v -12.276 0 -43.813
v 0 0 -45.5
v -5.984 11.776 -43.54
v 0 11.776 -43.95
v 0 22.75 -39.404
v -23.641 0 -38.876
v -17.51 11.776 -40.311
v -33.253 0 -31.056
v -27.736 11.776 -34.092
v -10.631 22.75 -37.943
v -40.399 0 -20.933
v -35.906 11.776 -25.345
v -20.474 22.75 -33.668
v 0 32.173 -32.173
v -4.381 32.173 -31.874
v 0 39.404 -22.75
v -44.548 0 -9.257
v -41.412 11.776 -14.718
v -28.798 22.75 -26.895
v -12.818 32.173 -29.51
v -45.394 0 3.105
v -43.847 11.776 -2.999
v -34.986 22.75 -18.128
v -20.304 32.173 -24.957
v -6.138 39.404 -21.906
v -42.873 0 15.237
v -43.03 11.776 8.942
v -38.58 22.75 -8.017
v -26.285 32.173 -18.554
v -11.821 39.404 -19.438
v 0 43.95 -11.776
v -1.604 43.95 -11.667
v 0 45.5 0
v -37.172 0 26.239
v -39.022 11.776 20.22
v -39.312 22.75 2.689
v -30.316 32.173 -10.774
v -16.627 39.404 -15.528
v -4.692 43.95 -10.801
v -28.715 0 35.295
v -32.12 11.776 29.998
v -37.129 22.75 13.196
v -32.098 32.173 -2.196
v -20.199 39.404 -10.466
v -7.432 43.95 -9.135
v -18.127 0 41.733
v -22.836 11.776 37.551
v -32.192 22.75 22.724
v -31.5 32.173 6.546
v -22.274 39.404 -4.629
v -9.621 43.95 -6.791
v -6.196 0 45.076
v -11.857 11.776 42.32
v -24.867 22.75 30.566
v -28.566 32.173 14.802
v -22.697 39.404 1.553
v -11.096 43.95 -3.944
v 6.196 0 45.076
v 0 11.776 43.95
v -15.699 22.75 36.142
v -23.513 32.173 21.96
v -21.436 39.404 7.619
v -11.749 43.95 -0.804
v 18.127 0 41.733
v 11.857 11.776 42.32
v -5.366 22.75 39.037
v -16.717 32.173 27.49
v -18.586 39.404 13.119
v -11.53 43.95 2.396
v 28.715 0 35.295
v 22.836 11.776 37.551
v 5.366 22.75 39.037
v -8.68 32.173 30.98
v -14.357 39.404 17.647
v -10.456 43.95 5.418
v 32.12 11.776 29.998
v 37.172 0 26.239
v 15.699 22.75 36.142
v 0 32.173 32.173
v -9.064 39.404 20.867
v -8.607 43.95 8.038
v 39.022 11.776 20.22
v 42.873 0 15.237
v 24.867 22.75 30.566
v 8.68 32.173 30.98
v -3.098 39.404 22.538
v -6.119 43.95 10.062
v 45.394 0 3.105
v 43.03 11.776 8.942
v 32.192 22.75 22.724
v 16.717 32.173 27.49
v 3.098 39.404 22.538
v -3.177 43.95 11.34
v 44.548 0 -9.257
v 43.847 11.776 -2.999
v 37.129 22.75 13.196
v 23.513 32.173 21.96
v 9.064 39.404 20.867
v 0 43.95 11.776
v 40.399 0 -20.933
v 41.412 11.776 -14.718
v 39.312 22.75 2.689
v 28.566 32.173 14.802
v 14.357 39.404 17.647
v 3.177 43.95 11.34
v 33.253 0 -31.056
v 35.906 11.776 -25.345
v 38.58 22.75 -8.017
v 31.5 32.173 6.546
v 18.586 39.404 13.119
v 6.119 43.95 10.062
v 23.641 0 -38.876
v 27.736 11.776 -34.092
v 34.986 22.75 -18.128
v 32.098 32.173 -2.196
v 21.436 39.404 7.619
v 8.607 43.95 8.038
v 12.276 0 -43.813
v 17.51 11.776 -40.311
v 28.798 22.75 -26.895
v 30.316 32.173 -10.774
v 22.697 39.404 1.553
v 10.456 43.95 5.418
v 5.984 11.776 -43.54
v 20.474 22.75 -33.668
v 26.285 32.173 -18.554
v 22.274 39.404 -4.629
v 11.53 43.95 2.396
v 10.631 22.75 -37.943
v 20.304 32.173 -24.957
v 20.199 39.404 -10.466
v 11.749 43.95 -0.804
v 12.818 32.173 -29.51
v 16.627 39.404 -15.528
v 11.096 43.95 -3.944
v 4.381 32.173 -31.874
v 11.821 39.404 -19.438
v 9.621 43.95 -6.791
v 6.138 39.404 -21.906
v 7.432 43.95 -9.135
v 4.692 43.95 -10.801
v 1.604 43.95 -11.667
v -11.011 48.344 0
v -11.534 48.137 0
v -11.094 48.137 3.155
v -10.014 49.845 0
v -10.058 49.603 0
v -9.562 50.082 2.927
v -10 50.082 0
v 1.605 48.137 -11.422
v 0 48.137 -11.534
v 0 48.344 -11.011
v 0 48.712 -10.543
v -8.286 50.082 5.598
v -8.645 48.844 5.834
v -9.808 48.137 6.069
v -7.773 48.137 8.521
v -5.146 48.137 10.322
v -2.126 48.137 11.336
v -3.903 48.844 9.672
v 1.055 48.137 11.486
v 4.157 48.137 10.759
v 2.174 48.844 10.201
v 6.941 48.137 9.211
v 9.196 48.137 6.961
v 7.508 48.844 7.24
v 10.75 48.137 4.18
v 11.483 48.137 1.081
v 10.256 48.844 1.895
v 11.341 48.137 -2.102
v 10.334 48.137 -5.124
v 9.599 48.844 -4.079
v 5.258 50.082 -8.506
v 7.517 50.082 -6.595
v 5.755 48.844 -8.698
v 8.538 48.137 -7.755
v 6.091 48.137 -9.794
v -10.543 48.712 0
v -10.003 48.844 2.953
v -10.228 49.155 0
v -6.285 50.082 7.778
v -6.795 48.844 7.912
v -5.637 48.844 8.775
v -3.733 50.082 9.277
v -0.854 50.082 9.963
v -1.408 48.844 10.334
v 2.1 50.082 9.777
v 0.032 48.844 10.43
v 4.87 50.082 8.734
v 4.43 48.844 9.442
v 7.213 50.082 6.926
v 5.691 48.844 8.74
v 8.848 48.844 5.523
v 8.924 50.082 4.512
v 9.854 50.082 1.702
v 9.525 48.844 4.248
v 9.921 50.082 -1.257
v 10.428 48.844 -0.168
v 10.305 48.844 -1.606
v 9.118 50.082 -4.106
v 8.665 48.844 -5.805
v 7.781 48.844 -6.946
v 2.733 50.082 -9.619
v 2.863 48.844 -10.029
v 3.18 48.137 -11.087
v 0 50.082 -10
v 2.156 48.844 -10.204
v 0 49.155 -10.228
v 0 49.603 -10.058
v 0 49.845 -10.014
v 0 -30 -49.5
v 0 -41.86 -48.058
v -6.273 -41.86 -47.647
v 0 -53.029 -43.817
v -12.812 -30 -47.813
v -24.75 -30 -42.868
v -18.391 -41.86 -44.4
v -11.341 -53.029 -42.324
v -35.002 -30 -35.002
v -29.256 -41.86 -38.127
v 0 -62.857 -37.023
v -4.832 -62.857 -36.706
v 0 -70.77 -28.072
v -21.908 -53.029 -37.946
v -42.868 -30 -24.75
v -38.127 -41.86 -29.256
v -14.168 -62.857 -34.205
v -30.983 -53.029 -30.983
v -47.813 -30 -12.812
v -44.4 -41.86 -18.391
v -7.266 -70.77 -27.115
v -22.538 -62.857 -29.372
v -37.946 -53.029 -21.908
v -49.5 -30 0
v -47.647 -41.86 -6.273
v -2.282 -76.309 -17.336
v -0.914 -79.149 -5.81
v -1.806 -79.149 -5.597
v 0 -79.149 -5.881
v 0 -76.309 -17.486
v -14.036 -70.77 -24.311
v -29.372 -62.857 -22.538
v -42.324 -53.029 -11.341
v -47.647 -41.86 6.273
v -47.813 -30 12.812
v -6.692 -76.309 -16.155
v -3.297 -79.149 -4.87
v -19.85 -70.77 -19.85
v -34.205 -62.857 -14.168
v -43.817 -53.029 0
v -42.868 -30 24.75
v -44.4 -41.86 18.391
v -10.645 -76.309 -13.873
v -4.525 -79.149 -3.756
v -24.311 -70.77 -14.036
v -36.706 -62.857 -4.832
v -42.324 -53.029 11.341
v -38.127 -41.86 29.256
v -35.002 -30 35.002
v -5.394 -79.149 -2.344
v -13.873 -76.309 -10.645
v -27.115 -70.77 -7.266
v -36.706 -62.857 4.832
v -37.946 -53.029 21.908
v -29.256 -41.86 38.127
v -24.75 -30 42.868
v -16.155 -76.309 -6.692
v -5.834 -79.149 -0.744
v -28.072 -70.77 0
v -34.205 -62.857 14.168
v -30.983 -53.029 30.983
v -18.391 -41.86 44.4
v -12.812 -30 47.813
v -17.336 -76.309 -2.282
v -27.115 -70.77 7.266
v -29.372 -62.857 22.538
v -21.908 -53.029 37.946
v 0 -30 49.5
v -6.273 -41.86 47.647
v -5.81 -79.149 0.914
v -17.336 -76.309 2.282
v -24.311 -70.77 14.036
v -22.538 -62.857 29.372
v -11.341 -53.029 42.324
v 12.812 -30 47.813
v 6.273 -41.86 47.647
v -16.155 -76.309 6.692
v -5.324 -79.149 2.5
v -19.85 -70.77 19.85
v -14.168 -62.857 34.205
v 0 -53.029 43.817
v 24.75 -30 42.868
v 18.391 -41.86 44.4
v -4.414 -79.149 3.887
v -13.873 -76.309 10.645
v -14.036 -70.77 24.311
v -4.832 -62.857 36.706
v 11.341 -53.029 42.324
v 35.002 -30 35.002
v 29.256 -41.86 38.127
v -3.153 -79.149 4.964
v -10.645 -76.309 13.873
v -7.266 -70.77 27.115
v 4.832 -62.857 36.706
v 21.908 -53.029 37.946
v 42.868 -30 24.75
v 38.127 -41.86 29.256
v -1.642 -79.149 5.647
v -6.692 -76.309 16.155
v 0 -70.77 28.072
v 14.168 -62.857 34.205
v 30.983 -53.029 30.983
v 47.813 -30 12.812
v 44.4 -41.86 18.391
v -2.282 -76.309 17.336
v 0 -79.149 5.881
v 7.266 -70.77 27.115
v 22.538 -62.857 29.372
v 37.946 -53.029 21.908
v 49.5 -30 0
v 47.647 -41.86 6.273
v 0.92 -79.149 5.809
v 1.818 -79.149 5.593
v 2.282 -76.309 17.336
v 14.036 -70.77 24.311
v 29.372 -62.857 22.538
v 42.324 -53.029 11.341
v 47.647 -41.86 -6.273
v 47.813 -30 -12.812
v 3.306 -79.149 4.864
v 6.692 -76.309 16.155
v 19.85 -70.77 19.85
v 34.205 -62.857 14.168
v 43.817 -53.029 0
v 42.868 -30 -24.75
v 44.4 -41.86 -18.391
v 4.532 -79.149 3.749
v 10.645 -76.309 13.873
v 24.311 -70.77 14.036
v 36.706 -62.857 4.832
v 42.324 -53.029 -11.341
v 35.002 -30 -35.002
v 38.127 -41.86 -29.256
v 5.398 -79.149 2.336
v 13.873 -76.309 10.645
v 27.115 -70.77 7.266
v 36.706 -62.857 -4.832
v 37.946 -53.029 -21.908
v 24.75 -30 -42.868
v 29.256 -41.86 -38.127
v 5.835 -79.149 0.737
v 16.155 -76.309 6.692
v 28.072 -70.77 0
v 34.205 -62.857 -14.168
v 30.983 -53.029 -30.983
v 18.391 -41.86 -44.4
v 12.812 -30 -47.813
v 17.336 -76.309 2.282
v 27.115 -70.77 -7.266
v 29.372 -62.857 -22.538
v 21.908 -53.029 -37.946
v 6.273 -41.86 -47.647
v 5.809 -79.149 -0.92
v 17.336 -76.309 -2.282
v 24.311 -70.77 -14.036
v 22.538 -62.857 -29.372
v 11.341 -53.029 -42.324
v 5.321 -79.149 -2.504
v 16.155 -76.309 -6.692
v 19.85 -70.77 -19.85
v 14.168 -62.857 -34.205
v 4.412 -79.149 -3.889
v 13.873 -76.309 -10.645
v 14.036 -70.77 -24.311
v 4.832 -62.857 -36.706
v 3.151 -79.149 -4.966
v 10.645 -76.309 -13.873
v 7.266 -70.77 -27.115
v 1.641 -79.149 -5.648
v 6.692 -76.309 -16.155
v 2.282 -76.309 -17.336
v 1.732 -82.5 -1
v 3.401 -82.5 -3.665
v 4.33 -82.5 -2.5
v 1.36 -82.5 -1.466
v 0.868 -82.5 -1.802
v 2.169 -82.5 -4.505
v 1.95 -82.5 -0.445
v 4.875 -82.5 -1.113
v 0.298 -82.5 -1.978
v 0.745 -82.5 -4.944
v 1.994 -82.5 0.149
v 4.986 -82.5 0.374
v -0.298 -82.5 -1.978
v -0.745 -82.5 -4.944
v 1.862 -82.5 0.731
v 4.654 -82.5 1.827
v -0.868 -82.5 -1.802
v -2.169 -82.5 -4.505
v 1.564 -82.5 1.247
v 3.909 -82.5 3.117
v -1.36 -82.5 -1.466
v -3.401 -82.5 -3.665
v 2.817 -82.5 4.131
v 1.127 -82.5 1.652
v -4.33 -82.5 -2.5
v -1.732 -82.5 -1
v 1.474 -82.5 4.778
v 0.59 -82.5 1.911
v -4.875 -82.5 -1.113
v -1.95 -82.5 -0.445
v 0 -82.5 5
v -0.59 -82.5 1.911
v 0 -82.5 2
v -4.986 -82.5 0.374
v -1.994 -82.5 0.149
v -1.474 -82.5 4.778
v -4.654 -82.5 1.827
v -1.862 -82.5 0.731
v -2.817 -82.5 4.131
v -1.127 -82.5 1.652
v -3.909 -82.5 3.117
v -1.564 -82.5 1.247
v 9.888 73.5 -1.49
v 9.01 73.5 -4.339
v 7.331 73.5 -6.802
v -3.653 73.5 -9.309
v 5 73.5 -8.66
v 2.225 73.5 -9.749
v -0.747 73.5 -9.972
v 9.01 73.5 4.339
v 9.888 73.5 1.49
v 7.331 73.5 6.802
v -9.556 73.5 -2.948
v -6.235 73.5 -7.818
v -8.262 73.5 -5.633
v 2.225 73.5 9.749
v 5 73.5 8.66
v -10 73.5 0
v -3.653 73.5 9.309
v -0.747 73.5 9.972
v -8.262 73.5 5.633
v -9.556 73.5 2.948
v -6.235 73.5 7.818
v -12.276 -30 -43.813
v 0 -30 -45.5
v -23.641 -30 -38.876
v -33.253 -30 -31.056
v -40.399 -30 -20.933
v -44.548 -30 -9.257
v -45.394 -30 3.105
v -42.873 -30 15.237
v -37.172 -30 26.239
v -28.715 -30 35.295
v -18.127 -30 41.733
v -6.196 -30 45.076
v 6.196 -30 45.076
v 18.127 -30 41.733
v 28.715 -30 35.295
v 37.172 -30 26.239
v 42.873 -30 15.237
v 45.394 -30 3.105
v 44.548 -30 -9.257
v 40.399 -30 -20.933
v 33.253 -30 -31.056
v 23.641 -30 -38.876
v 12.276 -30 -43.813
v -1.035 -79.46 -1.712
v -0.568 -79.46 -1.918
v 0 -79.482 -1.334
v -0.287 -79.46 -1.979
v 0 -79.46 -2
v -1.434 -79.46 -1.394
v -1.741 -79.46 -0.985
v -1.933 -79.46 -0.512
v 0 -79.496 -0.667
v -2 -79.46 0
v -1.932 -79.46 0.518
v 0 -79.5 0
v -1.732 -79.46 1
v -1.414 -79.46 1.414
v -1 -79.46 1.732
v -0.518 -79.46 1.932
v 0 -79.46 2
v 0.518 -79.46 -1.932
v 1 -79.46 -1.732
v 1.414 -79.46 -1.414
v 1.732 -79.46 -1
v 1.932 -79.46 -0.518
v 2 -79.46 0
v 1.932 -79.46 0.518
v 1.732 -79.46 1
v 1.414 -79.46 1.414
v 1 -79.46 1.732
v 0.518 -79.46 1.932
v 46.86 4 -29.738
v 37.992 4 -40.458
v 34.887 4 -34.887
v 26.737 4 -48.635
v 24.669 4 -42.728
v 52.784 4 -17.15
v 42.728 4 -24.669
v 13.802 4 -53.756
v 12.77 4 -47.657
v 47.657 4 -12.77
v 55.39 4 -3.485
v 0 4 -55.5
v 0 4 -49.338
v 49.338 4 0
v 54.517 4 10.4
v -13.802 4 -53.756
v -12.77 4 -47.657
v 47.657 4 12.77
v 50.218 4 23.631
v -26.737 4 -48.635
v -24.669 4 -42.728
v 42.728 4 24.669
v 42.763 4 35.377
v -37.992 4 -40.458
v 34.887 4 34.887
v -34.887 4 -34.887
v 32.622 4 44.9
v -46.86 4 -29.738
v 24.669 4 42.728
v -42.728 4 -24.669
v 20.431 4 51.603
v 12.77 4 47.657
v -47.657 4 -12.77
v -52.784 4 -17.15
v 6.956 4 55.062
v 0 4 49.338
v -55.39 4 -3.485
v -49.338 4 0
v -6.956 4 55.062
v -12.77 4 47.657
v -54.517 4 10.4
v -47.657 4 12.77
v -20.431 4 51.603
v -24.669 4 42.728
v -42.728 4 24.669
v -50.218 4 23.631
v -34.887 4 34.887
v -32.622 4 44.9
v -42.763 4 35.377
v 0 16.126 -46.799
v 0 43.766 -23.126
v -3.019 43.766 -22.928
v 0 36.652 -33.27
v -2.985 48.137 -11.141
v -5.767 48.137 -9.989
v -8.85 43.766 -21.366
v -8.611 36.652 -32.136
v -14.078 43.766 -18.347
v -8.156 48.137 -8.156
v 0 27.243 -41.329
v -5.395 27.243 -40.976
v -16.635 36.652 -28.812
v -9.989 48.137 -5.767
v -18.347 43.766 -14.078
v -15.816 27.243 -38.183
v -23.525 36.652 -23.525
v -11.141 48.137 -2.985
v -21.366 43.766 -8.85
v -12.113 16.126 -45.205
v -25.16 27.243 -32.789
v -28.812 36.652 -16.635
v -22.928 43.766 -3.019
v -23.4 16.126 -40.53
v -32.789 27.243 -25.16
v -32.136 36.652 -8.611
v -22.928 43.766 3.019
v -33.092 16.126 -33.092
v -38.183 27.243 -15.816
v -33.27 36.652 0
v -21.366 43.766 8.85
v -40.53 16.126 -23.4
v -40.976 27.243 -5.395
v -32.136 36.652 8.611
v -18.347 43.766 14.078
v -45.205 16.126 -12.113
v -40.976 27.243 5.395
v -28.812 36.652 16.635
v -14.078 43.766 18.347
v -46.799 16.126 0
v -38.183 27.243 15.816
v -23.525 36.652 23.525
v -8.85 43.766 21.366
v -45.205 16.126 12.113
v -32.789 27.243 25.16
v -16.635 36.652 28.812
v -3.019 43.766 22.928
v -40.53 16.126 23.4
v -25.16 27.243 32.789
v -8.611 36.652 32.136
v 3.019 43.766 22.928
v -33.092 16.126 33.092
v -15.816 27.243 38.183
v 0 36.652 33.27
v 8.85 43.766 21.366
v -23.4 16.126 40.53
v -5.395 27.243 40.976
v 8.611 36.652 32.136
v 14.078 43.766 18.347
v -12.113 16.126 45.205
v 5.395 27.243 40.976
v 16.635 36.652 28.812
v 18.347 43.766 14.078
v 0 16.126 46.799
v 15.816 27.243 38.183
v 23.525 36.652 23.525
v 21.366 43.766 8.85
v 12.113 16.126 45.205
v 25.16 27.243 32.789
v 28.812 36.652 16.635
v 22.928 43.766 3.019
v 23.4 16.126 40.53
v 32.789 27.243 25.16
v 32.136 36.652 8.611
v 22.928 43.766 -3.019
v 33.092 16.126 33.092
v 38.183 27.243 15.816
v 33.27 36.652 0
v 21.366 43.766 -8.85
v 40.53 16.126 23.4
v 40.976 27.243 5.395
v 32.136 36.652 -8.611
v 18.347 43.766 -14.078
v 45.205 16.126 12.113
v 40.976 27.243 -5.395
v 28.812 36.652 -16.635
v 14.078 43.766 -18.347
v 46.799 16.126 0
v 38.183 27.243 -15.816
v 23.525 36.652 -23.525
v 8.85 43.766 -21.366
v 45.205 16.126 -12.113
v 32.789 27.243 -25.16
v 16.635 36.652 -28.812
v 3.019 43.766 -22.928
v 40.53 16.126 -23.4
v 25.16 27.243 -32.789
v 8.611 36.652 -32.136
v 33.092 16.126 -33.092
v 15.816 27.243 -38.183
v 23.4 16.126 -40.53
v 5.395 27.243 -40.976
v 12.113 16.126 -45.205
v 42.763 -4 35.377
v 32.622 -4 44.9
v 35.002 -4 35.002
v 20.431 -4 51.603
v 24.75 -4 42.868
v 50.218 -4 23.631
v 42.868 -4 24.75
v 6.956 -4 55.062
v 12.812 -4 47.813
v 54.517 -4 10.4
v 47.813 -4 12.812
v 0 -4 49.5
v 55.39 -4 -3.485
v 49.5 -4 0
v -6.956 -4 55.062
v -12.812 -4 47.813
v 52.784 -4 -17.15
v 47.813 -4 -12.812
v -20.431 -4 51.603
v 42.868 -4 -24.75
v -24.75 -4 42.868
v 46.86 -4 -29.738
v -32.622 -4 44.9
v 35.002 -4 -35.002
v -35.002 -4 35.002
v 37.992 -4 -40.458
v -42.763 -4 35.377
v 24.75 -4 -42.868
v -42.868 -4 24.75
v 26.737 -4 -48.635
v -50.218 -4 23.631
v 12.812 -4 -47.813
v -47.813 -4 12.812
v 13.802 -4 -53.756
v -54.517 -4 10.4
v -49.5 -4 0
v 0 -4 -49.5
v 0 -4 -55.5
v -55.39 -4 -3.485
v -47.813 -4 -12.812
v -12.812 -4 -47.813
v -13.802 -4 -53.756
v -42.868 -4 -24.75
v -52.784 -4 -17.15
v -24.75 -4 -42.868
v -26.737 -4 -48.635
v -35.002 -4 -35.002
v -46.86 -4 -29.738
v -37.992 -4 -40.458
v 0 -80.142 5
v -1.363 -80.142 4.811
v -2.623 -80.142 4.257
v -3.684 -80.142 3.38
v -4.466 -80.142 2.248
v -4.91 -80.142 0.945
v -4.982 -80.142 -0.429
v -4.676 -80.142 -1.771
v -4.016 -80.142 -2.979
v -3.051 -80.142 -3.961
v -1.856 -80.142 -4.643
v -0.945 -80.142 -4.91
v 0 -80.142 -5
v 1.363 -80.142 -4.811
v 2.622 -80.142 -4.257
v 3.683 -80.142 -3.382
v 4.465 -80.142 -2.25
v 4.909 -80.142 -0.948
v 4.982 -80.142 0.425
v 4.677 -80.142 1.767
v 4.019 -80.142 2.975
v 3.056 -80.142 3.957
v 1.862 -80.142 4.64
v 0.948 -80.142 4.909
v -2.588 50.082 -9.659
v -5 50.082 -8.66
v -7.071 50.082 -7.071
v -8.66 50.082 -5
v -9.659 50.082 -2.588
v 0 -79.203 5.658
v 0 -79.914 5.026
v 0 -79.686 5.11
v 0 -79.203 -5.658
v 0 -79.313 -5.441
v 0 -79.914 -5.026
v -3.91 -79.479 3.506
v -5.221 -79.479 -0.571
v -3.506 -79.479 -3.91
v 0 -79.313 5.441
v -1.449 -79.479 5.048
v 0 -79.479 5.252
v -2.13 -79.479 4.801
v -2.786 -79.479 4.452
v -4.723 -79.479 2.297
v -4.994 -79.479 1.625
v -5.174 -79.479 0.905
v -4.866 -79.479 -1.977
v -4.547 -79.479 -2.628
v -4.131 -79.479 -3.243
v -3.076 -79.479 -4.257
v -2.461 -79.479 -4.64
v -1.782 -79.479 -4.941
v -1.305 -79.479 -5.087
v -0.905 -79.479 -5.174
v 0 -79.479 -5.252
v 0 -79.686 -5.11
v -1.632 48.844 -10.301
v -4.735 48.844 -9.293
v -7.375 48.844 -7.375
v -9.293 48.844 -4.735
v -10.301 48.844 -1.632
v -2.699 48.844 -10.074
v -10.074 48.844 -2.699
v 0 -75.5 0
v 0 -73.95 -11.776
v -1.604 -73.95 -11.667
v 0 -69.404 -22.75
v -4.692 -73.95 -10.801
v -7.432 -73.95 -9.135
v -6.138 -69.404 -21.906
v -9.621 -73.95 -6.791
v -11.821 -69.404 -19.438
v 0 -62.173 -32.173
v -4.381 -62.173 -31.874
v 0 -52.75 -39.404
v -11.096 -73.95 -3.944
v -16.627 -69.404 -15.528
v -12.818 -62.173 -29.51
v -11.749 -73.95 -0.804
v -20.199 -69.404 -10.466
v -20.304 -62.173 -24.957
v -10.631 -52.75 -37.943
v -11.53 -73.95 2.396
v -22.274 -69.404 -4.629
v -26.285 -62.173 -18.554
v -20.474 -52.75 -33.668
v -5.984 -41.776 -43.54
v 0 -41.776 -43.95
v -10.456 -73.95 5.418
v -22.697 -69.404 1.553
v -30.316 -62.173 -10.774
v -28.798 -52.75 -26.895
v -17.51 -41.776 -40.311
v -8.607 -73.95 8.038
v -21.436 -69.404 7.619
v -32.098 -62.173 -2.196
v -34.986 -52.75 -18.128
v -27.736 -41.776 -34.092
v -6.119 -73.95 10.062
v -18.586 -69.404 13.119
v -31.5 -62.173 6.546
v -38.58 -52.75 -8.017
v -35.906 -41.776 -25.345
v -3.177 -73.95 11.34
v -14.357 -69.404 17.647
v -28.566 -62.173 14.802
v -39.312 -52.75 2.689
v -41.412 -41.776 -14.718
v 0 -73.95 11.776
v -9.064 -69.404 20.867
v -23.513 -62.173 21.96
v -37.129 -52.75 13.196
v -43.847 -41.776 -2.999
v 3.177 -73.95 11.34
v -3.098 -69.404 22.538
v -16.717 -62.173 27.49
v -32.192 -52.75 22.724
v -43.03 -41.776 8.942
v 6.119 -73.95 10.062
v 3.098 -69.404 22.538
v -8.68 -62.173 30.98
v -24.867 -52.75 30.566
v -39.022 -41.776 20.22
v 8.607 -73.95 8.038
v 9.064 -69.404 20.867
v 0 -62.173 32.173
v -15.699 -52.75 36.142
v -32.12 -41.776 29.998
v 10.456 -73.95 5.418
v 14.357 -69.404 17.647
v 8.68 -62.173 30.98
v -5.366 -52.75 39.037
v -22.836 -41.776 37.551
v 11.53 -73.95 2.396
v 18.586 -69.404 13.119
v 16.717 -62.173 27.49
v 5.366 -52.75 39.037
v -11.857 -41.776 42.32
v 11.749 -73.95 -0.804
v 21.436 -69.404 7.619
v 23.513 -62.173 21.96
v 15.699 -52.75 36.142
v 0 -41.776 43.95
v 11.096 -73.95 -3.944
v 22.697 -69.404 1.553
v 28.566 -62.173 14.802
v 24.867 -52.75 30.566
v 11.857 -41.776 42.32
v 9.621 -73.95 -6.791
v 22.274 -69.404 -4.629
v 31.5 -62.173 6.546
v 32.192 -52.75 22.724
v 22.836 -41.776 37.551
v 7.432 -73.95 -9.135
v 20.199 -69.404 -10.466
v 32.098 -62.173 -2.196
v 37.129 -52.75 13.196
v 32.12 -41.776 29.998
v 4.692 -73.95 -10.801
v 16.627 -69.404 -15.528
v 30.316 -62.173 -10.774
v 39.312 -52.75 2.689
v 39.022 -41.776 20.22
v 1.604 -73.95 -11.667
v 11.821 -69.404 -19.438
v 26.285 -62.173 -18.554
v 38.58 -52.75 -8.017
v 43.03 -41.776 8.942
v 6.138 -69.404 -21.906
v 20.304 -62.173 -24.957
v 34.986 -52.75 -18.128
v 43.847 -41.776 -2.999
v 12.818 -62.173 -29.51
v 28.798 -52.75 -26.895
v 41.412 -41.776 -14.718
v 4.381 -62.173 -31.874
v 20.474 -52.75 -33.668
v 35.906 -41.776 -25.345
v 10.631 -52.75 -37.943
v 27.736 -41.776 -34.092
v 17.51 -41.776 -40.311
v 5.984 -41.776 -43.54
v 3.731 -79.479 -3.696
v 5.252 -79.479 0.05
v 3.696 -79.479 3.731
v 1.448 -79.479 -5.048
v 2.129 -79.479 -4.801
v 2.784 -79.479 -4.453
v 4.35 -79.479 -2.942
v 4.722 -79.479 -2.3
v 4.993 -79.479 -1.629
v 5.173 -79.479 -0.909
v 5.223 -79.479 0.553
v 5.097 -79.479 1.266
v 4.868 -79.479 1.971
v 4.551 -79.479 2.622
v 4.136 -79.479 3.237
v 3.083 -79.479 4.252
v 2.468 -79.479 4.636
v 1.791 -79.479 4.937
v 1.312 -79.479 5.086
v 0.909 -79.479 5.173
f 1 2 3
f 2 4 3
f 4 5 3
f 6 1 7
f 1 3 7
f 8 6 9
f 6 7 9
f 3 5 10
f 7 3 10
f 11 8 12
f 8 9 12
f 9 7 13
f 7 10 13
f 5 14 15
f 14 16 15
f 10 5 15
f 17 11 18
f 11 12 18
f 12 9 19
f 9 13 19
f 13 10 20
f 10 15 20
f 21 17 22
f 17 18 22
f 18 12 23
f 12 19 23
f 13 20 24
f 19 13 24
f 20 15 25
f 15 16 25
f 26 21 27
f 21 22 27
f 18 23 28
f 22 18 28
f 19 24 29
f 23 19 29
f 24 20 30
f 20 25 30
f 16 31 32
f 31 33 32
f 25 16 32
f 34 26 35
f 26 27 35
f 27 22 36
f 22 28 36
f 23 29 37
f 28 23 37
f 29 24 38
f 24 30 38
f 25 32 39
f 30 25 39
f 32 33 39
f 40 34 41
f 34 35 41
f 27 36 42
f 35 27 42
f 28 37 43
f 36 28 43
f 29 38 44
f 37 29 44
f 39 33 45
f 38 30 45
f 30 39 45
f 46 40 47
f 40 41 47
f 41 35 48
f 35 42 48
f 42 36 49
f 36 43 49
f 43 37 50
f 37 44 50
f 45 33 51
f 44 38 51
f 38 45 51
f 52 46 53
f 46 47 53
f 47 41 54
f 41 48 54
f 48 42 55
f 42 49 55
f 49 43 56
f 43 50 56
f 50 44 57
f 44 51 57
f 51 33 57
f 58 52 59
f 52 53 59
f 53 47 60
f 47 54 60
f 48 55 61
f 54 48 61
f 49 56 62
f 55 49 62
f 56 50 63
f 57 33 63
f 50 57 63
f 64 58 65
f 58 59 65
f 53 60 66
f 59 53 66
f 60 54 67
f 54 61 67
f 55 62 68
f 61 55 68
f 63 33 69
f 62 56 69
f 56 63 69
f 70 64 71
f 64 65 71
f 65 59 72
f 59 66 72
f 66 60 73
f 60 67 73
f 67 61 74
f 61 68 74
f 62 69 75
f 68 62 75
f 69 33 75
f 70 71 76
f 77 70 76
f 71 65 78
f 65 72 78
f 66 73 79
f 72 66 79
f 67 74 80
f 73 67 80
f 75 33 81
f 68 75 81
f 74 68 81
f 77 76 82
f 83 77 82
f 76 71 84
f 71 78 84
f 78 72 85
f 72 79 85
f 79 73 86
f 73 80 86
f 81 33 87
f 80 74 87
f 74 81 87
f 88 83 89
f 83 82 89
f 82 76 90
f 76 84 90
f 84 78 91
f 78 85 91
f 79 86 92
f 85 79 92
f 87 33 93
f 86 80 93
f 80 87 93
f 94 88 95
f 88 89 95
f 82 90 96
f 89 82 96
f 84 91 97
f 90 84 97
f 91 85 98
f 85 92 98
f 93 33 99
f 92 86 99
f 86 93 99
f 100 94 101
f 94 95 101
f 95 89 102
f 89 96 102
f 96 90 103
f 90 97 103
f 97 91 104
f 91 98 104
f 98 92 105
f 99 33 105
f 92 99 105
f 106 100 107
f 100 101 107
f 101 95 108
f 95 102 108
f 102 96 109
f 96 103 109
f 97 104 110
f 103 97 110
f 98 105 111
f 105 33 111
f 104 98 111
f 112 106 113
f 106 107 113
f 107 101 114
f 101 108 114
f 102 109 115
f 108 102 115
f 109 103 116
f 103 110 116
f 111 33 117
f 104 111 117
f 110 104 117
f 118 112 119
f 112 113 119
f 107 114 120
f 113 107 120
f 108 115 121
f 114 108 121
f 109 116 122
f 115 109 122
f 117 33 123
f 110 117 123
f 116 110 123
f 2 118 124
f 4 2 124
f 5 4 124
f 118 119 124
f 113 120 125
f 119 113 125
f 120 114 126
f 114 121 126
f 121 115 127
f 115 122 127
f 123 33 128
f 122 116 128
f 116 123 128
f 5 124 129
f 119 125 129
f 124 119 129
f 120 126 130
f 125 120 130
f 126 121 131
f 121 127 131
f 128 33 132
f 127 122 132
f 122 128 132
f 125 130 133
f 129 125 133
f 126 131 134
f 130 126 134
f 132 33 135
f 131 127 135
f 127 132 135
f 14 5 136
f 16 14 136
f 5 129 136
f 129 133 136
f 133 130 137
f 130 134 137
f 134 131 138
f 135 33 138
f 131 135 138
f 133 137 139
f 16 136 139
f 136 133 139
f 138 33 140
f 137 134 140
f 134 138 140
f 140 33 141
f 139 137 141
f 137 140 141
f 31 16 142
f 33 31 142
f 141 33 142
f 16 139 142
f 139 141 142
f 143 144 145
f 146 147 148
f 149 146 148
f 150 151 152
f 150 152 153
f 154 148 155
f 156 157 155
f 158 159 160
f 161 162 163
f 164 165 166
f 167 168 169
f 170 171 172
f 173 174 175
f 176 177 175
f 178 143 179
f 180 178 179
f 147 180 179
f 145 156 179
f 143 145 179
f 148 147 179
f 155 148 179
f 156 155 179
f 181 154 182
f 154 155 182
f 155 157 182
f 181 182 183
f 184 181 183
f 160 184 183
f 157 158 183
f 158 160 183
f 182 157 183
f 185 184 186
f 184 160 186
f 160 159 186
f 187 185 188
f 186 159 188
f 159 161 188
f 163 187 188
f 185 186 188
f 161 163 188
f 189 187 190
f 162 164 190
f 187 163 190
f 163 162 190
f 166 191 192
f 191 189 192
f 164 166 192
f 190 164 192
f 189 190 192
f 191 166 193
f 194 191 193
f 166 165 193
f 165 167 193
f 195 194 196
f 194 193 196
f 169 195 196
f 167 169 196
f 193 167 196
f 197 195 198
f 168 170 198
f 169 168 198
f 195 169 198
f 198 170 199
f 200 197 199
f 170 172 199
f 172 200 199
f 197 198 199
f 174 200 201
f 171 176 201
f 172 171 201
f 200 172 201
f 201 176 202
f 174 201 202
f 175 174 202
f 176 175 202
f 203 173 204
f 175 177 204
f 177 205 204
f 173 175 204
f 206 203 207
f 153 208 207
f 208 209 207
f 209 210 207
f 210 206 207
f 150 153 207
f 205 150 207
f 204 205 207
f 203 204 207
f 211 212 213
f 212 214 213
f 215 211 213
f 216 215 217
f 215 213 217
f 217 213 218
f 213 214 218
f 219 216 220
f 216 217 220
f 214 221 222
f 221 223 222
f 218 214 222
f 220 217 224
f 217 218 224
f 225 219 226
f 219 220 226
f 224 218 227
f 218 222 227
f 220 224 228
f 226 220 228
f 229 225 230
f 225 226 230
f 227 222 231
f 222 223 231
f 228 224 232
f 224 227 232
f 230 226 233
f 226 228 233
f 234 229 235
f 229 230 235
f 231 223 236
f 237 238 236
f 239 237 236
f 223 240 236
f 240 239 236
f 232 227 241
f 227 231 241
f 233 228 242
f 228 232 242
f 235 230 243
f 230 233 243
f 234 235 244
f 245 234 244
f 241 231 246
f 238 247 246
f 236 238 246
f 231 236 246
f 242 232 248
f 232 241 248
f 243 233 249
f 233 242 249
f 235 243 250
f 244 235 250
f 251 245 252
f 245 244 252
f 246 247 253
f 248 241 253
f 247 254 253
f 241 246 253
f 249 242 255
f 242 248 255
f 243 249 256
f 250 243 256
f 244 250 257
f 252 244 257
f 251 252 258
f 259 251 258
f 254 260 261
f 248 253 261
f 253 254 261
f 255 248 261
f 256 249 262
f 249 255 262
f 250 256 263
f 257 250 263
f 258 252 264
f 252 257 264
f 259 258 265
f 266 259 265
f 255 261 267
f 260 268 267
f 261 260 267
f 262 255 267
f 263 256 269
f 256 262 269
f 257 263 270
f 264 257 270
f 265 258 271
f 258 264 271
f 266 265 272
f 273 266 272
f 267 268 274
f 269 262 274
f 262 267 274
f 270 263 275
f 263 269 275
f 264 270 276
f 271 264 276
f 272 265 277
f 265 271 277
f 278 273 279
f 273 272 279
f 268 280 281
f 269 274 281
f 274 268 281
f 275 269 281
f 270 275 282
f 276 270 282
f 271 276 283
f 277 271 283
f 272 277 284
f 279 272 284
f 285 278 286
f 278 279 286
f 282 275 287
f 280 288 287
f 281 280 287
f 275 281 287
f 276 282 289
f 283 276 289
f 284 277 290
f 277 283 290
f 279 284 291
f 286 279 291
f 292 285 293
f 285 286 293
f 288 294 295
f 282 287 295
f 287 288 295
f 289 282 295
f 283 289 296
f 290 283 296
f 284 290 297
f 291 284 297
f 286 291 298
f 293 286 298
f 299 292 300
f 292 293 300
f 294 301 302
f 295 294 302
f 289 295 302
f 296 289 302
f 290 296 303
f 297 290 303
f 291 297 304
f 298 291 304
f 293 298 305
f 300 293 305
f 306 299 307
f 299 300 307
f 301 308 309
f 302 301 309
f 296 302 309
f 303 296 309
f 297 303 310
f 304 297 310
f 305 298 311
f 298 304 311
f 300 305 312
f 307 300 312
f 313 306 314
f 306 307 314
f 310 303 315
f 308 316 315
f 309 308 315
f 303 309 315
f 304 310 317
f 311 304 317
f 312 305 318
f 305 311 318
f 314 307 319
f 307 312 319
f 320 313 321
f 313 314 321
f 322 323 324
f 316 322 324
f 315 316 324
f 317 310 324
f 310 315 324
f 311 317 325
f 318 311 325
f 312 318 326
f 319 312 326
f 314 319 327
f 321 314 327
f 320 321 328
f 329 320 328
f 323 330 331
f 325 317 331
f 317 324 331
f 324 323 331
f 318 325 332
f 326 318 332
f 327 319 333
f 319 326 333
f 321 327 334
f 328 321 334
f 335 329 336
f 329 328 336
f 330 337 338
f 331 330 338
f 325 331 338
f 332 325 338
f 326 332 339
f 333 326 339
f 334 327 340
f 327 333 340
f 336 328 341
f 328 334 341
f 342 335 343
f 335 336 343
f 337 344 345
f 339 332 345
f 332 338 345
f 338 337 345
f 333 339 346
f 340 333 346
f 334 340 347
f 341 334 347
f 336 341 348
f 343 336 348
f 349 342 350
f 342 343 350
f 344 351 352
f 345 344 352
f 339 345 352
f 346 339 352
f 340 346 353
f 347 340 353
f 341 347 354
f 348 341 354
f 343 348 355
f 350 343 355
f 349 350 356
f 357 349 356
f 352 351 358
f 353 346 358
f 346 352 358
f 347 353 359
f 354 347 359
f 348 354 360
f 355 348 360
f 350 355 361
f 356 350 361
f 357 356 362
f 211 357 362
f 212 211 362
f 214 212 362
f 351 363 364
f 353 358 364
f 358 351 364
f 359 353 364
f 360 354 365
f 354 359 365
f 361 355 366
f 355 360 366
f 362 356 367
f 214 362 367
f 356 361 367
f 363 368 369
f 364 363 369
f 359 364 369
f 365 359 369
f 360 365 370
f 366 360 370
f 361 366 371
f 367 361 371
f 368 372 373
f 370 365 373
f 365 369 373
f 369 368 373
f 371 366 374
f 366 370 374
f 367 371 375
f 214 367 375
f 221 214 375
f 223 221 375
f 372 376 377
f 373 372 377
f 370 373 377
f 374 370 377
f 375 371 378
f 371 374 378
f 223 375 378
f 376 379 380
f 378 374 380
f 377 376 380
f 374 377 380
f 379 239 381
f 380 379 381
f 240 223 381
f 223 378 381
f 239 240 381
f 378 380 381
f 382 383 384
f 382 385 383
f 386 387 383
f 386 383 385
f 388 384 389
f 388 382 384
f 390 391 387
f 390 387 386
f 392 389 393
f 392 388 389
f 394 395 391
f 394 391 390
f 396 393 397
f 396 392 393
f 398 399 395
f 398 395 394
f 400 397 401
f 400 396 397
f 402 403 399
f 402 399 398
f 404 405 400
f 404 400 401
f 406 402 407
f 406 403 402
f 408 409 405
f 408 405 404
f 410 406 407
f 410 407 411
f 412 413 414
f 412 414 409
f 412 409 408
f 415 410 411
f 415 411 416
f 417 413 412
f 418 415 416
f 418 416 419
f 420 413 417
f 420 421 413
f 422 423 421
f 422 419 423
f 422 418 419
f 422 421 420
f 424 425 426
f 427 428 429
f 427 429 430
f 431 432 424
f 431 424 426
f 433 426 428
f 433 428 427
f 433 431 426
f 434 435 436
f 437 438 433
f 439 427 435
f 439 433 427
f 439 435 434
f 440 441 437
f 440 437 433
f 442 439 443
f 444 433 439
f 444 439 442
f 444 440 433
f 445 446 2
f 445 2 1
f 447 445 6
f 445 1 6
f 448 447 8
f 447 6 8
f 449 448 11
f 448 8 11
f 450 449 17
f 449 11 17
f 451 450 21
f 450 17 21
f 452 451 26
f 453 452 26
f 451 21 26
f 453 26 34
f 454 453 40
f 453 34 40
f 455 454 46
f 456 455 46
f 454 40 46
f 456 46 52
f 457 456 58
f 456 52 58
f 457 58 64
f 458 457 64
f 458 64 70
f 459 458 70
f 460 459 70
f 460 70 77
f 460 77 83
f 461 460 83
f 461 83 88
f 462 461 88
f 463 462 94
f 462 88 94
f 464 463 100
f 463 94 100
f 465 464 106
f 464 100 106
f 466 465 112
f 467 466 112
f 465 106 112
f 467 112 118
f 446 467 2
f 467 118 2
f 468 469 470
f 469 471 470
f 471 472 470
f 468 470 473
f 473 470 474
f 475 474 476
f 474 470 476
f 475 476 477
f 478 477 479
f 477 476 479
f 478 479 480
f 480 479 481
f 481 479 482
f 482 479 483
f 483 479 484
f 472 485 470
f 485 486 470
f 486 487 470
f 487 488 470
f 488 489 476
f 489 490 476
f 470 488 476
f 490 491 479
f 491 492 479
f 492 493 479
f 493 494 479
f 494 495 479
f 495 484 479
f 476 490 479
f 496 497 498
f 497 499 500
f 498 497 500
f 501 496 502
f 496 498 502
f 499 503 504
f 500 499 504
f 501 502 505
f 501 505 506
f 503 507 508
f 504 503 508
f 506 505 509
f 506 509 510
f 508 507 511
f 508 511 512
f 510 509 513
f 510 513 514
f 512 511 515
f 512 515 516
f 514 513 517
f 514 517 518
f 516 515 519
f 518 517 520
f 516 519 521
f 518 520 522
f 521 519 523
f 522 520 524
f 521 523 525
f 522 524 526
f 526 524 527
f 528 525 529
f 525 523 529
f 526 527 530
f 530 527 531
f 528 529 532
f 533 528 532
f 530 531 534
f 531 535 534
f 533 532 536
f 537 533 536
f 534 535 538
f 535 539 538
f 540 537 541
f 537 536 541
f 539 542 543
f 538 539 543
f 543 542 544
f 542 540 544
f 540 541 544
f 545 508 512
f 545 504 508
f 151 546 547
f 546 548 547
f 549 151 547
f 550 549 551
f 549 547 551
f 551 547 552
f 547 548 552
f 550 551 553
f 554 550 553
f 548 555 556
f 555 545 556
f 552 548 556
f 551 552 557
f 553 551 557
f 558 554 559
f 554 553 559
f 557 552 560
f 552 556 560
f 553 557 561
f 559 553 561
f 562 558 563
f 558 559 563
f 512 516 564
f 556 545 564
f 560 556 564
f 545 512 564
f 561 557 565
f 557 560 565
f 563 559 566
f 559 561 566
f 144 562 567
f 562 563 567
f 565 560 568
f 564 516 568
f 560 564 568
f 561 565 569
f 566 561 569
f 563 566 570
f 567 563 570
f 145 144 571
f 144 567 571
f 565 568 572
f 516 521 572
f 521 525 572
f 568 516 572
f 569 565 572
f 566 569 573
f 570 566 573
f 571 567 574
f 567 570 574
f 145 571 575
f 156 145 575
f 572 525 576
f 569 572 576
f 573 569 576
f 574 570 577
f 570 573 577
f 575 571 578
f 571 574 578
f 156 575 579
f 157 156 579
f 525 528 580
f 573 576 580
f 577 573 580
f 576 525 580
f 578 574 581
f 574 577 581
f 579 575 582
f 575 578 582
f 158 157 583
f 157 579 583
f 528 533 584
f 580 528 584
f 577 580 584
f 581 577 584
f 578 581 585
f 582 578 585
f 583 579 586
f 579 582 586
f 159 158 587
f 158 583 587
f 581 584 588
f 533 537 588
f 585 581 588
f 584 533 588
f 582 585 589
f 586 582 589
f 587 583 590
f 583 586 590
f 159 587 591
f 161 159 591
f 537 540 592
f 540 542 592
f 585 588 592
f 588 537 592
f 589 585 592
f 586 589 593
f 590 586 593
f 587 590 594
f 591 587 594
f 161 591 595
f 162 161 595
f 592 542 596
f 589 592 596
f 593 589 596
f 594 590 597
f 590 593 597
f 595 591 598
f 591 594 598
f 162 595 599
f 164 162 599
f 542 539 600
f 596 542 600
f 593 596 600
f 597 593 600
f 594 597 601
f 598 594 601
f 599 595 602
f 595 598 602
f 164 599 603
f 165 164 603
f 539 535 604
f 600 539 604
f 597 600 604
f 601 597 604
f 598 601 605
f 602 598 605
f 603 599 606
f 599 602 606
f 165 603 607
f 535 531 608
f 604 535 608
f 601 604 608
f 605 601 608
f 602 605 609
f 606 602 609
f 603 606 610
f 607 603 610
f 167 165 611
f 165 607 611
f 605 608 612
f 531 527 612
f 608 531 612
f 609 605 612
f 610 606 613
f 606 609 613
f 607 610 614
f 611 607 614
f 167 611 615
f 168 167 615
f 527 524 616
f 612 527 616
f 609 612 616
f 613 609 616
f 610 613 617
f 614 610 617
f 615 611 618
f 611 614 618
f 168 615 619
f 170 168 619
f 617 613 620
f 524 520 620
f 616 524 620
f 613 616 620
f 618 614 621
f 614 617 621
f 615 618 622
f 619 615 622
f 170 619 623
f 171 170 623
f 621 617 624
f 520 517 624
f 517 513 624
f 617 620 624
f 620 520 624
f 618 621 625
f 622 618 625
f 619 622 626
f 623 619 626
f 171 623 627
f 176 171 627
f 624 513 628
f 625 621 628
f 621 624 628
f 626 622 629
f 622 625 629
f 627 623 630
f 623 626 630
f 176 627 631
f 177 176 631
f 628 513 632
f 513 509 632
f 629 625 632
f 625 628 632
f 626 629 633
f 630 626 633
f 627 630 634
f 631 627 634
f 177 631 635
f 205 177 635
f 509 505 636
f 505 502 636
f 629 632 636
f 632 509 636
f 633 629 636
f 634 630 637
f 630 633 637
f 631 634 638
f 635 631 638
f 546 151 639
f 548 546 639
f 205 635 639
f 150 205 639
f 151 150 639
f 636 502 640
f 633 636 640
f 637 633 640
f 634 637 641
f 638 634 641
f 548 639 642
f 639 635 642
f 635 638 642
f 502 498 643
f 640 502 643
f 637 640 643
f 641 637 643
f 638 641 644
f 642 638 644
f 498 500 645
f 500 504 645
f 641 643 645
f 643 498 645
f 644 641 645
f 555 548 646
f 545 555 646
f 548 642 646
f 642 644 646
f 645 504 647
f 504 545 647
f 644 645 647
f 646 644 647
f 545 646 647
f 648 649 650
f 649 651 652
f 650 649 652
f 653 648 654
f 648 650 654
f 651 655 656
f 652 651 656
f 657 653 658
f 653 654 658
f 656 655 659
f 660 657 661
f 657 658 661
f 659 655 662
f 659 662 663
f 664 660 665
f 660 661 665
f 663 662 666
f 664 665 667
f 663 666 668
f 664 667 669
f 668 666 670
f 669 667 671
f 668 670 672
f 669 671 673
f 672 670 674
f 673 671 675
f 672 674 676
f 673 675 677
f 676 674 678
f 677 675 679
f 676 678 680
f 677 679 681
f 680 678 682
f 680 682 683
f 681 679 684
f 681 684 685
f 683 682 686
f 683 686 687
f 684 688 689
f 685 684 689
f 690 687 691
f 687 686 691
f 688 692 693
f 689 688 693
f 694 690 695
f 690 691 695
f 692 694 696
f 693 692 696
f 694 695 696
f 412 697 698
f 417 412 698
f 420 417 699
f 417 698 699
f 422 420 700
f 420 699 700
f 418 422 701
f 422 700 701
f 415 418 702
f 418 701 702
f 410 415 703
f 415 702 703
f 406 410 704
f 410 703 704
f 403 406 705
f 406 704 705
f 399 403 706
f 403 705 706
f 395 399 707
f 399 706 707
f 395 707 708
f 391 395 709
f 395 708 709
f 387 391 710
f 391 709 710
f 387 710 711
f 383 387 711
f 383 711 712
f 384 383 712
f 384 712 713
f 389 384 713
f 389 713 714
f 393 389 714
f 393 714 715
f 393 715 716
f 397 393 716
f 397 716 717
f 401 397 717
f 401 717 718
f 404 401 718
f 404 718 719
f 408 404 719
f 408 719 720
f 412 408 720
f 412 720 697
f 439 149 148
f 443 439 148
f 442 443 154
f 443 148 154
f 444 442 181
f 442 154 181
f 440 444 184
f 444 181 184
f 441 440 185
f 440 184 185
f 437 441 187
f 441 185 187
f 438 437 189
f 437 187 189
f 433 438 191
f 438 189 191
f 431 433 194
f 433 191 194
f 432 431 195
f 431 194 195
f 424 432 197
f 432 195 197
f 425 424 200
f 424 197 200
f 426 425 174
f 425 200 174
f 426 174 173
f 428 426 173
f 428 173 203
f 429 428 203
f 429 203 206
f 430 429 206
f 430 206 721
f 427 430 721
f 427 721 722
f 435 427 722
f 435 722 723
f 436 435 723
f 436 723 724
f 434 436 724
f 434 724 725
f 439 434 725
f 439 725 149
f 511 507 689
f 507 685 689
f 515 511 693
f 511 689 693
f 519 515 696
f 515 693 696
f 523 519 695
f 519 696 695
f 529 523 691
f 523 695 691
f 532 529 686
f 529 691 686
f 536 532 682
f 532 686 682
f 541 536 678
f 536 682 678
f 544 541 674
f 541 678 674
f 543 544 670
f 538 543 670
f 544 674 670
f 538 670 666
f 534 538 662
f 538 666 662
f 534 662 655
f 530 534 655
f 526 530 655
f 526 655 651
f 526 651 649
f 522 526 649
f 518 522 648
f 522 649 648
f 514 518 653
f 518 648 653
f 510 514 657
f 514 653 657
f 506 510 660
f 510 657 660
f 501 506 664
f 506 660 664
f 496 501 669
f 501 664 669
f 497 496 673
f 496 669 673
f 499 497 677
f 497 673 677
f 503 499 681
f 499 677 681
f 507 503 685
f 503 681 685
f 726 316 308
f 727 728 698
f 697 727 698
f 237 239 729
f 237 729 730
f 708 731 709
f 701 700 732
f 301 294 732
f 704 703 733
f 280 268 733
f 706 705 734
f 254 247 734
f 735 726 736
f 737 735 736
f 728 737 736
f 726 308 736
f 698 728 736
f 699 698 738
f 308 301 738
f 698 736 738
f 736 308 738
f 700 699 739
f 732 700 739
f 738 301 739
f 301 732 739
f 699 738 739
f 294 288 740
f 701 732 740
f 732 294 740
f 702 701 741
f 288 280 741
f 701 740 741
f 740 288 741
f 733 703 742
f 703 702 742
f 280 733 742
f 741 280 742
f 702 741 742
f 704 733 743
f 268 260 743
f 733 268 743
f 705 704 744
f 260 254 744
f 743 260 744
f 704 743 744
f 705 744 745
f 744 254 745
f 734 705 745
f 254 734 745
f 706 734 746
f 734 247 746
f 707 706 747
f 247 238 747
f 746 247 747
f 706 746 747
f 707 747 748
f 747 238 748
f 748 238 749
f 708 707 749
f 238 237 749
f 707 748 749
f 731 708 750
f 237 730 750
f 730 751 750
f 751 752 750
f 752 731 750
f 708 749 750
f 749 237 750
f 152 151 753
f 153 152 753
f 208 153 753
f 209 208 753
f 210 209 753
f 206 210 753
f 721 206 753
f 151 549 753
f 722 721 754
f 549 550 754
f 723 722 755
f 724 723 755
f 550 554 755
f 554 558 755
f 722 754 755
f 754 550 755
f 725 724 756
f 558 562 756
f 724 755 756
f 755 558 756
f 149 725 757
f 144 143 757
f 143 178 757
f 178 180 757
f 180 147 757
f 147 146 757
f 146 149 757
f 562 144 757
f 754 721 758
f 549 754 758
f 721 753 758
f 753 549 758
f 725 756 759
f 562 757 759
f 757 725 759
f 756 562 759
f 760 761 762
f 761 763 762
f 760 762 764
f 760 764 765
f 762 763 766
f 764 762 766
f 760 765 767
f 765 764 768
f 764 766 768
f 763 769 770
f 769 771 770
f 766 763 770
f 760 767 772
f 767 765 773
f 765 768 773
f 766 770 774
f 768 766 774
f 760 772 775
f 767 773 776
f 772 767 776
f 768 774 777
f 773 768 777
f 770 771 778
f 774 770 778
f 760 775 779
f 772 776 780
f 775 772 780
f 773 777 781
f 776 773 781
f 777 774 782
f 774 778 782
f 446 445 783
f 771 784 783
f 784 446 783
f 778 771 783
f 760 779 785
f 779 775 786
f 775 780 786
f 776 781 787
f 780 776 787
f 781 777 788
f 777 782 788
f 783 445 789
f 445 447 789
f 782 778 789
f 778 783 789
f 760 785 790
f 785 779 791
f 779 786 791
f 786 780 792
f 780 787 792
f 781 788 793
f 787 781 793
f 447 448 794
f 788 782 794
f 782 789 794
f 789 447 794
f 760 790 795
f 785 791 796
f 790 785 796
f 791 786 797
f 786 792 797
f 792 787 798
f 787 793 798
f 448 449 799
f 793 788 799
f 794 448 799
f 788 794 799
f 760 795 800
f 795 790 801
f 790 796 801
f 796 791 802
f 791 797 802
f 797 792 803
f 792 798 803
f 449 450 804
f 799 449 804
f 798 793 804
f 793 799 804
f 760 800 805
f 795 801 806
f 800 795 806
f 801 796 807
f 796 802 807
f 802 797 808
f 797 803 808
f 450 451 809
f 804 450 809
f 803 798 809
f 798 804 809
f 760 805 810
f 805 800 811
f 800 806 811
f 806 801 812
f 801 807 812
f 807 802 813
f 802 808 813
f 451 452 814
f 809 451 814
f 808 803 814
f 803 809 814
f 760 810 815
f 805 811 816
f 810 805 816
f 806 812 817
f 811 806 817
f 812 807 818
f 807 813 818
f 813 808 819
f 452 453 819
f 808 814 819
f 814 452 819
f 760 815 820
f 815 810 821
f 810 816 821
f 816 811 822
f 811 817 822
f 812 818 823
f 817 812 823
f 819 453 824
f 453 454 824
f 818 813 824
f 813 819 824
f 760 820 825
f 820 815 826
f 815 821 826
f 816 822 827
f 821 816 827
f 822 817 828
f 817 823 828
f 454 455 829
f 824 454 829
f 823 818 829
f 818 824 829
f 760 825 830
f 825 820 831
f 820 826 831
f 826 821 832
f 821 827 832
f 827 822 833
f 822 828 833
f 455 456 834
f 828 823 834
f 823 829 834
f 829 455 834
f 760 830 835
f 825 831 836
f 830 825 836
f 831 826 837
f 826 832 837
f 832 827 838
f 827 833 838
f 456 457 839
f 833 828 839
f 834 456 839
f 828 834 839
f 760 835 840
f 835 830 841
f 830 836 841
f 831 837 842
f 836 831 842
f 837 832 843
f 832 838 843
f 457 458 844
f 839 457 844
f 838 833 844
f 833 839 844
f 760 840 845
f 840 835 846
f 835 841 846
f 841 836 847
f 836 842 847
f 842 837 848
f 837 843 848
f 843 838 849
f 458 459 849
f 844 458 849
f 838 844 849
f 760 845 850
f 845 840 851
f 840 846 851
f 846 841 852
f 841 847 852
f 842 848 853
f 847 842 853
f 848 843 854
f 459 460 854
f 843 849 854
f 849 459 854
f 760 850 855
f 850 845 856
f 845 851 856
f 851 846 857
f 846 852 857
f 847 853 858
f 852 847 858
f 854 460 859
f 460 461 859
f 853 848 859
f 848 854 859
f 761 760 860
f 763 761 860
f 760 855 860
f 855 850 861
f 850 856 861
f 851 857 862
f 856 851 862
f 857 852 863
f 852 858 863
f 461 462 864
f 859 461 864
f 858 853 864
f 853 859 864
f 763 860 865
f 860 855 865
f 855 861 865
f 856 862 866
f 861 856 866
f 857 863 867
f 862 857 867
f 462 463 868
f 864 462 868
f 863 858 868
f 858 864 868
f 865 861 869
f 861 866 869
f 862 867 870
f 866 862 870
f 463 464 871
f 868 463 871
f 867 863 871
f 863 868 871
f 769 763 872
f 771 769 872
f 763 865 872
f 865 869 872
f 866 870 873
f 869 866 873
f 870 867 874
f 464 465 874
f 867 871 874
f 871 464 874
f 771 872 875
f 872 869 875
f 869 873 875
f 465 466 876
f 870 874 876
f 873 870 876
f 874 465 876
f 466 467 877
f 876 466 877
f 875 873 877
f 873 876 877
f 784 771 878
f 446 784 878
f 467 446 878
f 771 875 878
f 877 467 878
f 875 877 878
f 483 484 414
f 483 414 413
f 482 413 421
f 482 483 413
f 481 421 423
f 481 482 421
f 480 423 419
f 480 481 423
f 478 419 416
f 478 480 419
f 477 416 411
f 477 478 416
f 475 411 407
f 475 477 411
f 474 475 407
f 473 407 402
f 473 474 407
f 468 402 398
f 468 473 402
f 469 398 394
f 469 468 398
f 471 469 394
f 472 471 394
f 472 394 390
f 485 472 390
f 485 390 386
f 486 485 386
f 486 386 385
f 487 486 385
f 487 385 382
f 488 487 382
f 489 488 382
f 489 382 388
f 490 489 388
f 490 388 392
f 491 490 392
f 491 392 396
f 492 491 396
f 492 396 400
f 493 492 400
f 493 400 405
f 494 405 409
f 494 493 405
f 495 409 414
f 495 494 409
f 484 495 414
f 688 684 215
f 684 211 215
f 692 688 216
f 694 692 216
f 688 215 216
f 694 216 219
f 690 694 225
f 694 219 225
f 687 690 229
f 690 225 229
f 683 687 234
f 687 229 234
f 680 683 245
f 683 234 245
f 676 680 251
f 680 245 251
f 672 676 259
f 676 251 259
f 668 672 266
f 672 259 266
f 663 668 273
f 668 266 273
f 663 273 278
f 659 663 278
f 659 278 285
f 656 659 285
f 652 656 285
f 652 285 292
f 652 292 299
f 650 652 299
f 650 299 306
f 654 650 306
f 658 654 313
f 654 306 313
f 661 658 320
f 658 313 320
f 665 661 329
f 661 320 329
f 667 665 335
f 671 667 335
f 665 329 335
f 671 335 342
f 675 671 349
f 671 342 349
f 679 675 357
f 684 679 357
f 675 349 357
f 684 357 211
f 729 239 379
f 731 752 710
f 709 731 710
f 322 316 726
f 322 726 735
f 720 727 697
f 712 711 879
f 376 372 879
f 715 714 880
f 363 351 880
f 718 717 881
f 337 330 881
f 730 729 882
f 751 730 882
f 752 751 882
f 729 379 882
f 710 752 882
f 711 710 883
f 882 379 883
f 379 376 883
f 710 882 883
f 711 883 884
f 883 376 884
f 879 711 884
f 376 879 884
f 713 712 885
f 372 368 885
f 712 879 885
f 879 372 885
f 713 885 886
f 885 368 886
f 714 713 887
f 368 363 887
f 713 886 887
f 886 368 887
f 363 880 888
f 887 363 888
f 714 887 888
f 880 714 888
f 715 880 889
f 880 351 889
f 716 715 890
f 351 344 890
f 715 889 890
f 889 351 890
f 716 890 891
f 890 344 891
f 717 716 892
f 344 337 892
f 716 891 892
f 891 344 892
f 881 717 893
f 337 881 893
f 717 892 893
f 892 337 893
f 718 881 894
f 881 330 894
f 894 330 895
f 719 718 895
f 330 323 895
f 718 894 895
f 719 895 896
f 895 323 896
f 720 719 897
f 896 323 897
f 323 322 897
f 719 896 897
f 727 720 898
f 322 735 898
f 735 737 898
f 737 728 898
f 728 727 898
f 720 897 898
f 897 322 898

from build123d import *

# Parameters (mm, degrees)
SKETCH2_R           = 10
BOSS_EXTRUDE1_DEPTH = 26
SKETCH3_R           = 5
SKETCH3_R_2         = 2
BOSS_EXTRUDE2_DEPTH = 5
FILLET1_R           = 2
FILLET3_R           = 1


with BuildPart() as part:
    # Sketch1 → Revolve2 (revolve)
    with BuildSketch(Plane.XY, mode=Mode.PRIVATE) as revolve2_sk:
        with BuildLine():
            Line((-55.5, -4), (-49.5, -4))
            Line((-49.5, -4), (-49.5, -30))
            ThreePointArc((-49.5, -30), (-35.001785669, -65.001785669), (0, -79.5))
            Line((0, -79.5), (0, -75.5))
            ThreePointArc((0, -75.5), (-32.173358544, -62.173358544), (-45.5, -30))
            Line((-45.5, -30), (-45.5, 0))
            ThreePointArc((-45.5, 0), (-32.173358544, 32.173358544), (0, 45.5))
            Line((0, 45.5), (0, 49.5))
            ThreePointArc((0, 49.5), (-33.557785982, 36.388528412), (-49.338119137, 4))
            Line((-49.338119137, 4), (-55.5, 4))
            Line((-55.5, 4), (-55.5, 0))
            Line((-55.5, 0), (-55.5, -4))
        make_face()
    revolve(revolve2_sk.sketch.rotate(Axis((0, -85.95, 0), (0, 1, 0)), 270), axis=Axis((0, -85.95, 0), (0, 1, 0)))

    # Sketch2 → Boss-Extrude1 (add)
    with BuildSketch(Plane(origin=(0, 47.5, 0), x_dir=(1, 0, 0), z_dir=(0, 1, 0))):
        with Locations(Location((0, 0, 0), (0, 0, 180))):
            Circle(SKETCH2_R)
    extrude(amount=BOSS_EXTRUDE1_DEPTH)

    # Sketch3 → Boss-Extrude2 (add)
    with BuildSketch(Plane(origin=(0, -77.5, 0), x_dir=(-1, 0, 0), z_dir=(0, -1, 0))):
        with Locations(Location((0, 0, 0), (0, 0, 270))):
            Circle(SKETCH3_R)
        with Locations(Location((0, 0, 0), (0, 0, 270))):
            Circle(SKETCH3_R_2, mode=Mode.SUBTRACT)
    extrude(amount=BOSS_EXTRUDE2_DEPTH)

    # Fillet1
    fillet1_edges = [part.edges().sort_by_distance(p)[0] for p in [
        (7.071067812, 48.479377059, 7.071067812),
    ]]
    fillet(fillet1_edges, radius=FILLET1_R)

    # Fillet3
    fillet3_edges = [part.edges().sort_by_distance(p)[0] for p in [
        (-4.999999999, -79.246827309, 0),
    ]]
    fillet(fillet3_edges, radius=FILLET3_R)


solid = part.part
